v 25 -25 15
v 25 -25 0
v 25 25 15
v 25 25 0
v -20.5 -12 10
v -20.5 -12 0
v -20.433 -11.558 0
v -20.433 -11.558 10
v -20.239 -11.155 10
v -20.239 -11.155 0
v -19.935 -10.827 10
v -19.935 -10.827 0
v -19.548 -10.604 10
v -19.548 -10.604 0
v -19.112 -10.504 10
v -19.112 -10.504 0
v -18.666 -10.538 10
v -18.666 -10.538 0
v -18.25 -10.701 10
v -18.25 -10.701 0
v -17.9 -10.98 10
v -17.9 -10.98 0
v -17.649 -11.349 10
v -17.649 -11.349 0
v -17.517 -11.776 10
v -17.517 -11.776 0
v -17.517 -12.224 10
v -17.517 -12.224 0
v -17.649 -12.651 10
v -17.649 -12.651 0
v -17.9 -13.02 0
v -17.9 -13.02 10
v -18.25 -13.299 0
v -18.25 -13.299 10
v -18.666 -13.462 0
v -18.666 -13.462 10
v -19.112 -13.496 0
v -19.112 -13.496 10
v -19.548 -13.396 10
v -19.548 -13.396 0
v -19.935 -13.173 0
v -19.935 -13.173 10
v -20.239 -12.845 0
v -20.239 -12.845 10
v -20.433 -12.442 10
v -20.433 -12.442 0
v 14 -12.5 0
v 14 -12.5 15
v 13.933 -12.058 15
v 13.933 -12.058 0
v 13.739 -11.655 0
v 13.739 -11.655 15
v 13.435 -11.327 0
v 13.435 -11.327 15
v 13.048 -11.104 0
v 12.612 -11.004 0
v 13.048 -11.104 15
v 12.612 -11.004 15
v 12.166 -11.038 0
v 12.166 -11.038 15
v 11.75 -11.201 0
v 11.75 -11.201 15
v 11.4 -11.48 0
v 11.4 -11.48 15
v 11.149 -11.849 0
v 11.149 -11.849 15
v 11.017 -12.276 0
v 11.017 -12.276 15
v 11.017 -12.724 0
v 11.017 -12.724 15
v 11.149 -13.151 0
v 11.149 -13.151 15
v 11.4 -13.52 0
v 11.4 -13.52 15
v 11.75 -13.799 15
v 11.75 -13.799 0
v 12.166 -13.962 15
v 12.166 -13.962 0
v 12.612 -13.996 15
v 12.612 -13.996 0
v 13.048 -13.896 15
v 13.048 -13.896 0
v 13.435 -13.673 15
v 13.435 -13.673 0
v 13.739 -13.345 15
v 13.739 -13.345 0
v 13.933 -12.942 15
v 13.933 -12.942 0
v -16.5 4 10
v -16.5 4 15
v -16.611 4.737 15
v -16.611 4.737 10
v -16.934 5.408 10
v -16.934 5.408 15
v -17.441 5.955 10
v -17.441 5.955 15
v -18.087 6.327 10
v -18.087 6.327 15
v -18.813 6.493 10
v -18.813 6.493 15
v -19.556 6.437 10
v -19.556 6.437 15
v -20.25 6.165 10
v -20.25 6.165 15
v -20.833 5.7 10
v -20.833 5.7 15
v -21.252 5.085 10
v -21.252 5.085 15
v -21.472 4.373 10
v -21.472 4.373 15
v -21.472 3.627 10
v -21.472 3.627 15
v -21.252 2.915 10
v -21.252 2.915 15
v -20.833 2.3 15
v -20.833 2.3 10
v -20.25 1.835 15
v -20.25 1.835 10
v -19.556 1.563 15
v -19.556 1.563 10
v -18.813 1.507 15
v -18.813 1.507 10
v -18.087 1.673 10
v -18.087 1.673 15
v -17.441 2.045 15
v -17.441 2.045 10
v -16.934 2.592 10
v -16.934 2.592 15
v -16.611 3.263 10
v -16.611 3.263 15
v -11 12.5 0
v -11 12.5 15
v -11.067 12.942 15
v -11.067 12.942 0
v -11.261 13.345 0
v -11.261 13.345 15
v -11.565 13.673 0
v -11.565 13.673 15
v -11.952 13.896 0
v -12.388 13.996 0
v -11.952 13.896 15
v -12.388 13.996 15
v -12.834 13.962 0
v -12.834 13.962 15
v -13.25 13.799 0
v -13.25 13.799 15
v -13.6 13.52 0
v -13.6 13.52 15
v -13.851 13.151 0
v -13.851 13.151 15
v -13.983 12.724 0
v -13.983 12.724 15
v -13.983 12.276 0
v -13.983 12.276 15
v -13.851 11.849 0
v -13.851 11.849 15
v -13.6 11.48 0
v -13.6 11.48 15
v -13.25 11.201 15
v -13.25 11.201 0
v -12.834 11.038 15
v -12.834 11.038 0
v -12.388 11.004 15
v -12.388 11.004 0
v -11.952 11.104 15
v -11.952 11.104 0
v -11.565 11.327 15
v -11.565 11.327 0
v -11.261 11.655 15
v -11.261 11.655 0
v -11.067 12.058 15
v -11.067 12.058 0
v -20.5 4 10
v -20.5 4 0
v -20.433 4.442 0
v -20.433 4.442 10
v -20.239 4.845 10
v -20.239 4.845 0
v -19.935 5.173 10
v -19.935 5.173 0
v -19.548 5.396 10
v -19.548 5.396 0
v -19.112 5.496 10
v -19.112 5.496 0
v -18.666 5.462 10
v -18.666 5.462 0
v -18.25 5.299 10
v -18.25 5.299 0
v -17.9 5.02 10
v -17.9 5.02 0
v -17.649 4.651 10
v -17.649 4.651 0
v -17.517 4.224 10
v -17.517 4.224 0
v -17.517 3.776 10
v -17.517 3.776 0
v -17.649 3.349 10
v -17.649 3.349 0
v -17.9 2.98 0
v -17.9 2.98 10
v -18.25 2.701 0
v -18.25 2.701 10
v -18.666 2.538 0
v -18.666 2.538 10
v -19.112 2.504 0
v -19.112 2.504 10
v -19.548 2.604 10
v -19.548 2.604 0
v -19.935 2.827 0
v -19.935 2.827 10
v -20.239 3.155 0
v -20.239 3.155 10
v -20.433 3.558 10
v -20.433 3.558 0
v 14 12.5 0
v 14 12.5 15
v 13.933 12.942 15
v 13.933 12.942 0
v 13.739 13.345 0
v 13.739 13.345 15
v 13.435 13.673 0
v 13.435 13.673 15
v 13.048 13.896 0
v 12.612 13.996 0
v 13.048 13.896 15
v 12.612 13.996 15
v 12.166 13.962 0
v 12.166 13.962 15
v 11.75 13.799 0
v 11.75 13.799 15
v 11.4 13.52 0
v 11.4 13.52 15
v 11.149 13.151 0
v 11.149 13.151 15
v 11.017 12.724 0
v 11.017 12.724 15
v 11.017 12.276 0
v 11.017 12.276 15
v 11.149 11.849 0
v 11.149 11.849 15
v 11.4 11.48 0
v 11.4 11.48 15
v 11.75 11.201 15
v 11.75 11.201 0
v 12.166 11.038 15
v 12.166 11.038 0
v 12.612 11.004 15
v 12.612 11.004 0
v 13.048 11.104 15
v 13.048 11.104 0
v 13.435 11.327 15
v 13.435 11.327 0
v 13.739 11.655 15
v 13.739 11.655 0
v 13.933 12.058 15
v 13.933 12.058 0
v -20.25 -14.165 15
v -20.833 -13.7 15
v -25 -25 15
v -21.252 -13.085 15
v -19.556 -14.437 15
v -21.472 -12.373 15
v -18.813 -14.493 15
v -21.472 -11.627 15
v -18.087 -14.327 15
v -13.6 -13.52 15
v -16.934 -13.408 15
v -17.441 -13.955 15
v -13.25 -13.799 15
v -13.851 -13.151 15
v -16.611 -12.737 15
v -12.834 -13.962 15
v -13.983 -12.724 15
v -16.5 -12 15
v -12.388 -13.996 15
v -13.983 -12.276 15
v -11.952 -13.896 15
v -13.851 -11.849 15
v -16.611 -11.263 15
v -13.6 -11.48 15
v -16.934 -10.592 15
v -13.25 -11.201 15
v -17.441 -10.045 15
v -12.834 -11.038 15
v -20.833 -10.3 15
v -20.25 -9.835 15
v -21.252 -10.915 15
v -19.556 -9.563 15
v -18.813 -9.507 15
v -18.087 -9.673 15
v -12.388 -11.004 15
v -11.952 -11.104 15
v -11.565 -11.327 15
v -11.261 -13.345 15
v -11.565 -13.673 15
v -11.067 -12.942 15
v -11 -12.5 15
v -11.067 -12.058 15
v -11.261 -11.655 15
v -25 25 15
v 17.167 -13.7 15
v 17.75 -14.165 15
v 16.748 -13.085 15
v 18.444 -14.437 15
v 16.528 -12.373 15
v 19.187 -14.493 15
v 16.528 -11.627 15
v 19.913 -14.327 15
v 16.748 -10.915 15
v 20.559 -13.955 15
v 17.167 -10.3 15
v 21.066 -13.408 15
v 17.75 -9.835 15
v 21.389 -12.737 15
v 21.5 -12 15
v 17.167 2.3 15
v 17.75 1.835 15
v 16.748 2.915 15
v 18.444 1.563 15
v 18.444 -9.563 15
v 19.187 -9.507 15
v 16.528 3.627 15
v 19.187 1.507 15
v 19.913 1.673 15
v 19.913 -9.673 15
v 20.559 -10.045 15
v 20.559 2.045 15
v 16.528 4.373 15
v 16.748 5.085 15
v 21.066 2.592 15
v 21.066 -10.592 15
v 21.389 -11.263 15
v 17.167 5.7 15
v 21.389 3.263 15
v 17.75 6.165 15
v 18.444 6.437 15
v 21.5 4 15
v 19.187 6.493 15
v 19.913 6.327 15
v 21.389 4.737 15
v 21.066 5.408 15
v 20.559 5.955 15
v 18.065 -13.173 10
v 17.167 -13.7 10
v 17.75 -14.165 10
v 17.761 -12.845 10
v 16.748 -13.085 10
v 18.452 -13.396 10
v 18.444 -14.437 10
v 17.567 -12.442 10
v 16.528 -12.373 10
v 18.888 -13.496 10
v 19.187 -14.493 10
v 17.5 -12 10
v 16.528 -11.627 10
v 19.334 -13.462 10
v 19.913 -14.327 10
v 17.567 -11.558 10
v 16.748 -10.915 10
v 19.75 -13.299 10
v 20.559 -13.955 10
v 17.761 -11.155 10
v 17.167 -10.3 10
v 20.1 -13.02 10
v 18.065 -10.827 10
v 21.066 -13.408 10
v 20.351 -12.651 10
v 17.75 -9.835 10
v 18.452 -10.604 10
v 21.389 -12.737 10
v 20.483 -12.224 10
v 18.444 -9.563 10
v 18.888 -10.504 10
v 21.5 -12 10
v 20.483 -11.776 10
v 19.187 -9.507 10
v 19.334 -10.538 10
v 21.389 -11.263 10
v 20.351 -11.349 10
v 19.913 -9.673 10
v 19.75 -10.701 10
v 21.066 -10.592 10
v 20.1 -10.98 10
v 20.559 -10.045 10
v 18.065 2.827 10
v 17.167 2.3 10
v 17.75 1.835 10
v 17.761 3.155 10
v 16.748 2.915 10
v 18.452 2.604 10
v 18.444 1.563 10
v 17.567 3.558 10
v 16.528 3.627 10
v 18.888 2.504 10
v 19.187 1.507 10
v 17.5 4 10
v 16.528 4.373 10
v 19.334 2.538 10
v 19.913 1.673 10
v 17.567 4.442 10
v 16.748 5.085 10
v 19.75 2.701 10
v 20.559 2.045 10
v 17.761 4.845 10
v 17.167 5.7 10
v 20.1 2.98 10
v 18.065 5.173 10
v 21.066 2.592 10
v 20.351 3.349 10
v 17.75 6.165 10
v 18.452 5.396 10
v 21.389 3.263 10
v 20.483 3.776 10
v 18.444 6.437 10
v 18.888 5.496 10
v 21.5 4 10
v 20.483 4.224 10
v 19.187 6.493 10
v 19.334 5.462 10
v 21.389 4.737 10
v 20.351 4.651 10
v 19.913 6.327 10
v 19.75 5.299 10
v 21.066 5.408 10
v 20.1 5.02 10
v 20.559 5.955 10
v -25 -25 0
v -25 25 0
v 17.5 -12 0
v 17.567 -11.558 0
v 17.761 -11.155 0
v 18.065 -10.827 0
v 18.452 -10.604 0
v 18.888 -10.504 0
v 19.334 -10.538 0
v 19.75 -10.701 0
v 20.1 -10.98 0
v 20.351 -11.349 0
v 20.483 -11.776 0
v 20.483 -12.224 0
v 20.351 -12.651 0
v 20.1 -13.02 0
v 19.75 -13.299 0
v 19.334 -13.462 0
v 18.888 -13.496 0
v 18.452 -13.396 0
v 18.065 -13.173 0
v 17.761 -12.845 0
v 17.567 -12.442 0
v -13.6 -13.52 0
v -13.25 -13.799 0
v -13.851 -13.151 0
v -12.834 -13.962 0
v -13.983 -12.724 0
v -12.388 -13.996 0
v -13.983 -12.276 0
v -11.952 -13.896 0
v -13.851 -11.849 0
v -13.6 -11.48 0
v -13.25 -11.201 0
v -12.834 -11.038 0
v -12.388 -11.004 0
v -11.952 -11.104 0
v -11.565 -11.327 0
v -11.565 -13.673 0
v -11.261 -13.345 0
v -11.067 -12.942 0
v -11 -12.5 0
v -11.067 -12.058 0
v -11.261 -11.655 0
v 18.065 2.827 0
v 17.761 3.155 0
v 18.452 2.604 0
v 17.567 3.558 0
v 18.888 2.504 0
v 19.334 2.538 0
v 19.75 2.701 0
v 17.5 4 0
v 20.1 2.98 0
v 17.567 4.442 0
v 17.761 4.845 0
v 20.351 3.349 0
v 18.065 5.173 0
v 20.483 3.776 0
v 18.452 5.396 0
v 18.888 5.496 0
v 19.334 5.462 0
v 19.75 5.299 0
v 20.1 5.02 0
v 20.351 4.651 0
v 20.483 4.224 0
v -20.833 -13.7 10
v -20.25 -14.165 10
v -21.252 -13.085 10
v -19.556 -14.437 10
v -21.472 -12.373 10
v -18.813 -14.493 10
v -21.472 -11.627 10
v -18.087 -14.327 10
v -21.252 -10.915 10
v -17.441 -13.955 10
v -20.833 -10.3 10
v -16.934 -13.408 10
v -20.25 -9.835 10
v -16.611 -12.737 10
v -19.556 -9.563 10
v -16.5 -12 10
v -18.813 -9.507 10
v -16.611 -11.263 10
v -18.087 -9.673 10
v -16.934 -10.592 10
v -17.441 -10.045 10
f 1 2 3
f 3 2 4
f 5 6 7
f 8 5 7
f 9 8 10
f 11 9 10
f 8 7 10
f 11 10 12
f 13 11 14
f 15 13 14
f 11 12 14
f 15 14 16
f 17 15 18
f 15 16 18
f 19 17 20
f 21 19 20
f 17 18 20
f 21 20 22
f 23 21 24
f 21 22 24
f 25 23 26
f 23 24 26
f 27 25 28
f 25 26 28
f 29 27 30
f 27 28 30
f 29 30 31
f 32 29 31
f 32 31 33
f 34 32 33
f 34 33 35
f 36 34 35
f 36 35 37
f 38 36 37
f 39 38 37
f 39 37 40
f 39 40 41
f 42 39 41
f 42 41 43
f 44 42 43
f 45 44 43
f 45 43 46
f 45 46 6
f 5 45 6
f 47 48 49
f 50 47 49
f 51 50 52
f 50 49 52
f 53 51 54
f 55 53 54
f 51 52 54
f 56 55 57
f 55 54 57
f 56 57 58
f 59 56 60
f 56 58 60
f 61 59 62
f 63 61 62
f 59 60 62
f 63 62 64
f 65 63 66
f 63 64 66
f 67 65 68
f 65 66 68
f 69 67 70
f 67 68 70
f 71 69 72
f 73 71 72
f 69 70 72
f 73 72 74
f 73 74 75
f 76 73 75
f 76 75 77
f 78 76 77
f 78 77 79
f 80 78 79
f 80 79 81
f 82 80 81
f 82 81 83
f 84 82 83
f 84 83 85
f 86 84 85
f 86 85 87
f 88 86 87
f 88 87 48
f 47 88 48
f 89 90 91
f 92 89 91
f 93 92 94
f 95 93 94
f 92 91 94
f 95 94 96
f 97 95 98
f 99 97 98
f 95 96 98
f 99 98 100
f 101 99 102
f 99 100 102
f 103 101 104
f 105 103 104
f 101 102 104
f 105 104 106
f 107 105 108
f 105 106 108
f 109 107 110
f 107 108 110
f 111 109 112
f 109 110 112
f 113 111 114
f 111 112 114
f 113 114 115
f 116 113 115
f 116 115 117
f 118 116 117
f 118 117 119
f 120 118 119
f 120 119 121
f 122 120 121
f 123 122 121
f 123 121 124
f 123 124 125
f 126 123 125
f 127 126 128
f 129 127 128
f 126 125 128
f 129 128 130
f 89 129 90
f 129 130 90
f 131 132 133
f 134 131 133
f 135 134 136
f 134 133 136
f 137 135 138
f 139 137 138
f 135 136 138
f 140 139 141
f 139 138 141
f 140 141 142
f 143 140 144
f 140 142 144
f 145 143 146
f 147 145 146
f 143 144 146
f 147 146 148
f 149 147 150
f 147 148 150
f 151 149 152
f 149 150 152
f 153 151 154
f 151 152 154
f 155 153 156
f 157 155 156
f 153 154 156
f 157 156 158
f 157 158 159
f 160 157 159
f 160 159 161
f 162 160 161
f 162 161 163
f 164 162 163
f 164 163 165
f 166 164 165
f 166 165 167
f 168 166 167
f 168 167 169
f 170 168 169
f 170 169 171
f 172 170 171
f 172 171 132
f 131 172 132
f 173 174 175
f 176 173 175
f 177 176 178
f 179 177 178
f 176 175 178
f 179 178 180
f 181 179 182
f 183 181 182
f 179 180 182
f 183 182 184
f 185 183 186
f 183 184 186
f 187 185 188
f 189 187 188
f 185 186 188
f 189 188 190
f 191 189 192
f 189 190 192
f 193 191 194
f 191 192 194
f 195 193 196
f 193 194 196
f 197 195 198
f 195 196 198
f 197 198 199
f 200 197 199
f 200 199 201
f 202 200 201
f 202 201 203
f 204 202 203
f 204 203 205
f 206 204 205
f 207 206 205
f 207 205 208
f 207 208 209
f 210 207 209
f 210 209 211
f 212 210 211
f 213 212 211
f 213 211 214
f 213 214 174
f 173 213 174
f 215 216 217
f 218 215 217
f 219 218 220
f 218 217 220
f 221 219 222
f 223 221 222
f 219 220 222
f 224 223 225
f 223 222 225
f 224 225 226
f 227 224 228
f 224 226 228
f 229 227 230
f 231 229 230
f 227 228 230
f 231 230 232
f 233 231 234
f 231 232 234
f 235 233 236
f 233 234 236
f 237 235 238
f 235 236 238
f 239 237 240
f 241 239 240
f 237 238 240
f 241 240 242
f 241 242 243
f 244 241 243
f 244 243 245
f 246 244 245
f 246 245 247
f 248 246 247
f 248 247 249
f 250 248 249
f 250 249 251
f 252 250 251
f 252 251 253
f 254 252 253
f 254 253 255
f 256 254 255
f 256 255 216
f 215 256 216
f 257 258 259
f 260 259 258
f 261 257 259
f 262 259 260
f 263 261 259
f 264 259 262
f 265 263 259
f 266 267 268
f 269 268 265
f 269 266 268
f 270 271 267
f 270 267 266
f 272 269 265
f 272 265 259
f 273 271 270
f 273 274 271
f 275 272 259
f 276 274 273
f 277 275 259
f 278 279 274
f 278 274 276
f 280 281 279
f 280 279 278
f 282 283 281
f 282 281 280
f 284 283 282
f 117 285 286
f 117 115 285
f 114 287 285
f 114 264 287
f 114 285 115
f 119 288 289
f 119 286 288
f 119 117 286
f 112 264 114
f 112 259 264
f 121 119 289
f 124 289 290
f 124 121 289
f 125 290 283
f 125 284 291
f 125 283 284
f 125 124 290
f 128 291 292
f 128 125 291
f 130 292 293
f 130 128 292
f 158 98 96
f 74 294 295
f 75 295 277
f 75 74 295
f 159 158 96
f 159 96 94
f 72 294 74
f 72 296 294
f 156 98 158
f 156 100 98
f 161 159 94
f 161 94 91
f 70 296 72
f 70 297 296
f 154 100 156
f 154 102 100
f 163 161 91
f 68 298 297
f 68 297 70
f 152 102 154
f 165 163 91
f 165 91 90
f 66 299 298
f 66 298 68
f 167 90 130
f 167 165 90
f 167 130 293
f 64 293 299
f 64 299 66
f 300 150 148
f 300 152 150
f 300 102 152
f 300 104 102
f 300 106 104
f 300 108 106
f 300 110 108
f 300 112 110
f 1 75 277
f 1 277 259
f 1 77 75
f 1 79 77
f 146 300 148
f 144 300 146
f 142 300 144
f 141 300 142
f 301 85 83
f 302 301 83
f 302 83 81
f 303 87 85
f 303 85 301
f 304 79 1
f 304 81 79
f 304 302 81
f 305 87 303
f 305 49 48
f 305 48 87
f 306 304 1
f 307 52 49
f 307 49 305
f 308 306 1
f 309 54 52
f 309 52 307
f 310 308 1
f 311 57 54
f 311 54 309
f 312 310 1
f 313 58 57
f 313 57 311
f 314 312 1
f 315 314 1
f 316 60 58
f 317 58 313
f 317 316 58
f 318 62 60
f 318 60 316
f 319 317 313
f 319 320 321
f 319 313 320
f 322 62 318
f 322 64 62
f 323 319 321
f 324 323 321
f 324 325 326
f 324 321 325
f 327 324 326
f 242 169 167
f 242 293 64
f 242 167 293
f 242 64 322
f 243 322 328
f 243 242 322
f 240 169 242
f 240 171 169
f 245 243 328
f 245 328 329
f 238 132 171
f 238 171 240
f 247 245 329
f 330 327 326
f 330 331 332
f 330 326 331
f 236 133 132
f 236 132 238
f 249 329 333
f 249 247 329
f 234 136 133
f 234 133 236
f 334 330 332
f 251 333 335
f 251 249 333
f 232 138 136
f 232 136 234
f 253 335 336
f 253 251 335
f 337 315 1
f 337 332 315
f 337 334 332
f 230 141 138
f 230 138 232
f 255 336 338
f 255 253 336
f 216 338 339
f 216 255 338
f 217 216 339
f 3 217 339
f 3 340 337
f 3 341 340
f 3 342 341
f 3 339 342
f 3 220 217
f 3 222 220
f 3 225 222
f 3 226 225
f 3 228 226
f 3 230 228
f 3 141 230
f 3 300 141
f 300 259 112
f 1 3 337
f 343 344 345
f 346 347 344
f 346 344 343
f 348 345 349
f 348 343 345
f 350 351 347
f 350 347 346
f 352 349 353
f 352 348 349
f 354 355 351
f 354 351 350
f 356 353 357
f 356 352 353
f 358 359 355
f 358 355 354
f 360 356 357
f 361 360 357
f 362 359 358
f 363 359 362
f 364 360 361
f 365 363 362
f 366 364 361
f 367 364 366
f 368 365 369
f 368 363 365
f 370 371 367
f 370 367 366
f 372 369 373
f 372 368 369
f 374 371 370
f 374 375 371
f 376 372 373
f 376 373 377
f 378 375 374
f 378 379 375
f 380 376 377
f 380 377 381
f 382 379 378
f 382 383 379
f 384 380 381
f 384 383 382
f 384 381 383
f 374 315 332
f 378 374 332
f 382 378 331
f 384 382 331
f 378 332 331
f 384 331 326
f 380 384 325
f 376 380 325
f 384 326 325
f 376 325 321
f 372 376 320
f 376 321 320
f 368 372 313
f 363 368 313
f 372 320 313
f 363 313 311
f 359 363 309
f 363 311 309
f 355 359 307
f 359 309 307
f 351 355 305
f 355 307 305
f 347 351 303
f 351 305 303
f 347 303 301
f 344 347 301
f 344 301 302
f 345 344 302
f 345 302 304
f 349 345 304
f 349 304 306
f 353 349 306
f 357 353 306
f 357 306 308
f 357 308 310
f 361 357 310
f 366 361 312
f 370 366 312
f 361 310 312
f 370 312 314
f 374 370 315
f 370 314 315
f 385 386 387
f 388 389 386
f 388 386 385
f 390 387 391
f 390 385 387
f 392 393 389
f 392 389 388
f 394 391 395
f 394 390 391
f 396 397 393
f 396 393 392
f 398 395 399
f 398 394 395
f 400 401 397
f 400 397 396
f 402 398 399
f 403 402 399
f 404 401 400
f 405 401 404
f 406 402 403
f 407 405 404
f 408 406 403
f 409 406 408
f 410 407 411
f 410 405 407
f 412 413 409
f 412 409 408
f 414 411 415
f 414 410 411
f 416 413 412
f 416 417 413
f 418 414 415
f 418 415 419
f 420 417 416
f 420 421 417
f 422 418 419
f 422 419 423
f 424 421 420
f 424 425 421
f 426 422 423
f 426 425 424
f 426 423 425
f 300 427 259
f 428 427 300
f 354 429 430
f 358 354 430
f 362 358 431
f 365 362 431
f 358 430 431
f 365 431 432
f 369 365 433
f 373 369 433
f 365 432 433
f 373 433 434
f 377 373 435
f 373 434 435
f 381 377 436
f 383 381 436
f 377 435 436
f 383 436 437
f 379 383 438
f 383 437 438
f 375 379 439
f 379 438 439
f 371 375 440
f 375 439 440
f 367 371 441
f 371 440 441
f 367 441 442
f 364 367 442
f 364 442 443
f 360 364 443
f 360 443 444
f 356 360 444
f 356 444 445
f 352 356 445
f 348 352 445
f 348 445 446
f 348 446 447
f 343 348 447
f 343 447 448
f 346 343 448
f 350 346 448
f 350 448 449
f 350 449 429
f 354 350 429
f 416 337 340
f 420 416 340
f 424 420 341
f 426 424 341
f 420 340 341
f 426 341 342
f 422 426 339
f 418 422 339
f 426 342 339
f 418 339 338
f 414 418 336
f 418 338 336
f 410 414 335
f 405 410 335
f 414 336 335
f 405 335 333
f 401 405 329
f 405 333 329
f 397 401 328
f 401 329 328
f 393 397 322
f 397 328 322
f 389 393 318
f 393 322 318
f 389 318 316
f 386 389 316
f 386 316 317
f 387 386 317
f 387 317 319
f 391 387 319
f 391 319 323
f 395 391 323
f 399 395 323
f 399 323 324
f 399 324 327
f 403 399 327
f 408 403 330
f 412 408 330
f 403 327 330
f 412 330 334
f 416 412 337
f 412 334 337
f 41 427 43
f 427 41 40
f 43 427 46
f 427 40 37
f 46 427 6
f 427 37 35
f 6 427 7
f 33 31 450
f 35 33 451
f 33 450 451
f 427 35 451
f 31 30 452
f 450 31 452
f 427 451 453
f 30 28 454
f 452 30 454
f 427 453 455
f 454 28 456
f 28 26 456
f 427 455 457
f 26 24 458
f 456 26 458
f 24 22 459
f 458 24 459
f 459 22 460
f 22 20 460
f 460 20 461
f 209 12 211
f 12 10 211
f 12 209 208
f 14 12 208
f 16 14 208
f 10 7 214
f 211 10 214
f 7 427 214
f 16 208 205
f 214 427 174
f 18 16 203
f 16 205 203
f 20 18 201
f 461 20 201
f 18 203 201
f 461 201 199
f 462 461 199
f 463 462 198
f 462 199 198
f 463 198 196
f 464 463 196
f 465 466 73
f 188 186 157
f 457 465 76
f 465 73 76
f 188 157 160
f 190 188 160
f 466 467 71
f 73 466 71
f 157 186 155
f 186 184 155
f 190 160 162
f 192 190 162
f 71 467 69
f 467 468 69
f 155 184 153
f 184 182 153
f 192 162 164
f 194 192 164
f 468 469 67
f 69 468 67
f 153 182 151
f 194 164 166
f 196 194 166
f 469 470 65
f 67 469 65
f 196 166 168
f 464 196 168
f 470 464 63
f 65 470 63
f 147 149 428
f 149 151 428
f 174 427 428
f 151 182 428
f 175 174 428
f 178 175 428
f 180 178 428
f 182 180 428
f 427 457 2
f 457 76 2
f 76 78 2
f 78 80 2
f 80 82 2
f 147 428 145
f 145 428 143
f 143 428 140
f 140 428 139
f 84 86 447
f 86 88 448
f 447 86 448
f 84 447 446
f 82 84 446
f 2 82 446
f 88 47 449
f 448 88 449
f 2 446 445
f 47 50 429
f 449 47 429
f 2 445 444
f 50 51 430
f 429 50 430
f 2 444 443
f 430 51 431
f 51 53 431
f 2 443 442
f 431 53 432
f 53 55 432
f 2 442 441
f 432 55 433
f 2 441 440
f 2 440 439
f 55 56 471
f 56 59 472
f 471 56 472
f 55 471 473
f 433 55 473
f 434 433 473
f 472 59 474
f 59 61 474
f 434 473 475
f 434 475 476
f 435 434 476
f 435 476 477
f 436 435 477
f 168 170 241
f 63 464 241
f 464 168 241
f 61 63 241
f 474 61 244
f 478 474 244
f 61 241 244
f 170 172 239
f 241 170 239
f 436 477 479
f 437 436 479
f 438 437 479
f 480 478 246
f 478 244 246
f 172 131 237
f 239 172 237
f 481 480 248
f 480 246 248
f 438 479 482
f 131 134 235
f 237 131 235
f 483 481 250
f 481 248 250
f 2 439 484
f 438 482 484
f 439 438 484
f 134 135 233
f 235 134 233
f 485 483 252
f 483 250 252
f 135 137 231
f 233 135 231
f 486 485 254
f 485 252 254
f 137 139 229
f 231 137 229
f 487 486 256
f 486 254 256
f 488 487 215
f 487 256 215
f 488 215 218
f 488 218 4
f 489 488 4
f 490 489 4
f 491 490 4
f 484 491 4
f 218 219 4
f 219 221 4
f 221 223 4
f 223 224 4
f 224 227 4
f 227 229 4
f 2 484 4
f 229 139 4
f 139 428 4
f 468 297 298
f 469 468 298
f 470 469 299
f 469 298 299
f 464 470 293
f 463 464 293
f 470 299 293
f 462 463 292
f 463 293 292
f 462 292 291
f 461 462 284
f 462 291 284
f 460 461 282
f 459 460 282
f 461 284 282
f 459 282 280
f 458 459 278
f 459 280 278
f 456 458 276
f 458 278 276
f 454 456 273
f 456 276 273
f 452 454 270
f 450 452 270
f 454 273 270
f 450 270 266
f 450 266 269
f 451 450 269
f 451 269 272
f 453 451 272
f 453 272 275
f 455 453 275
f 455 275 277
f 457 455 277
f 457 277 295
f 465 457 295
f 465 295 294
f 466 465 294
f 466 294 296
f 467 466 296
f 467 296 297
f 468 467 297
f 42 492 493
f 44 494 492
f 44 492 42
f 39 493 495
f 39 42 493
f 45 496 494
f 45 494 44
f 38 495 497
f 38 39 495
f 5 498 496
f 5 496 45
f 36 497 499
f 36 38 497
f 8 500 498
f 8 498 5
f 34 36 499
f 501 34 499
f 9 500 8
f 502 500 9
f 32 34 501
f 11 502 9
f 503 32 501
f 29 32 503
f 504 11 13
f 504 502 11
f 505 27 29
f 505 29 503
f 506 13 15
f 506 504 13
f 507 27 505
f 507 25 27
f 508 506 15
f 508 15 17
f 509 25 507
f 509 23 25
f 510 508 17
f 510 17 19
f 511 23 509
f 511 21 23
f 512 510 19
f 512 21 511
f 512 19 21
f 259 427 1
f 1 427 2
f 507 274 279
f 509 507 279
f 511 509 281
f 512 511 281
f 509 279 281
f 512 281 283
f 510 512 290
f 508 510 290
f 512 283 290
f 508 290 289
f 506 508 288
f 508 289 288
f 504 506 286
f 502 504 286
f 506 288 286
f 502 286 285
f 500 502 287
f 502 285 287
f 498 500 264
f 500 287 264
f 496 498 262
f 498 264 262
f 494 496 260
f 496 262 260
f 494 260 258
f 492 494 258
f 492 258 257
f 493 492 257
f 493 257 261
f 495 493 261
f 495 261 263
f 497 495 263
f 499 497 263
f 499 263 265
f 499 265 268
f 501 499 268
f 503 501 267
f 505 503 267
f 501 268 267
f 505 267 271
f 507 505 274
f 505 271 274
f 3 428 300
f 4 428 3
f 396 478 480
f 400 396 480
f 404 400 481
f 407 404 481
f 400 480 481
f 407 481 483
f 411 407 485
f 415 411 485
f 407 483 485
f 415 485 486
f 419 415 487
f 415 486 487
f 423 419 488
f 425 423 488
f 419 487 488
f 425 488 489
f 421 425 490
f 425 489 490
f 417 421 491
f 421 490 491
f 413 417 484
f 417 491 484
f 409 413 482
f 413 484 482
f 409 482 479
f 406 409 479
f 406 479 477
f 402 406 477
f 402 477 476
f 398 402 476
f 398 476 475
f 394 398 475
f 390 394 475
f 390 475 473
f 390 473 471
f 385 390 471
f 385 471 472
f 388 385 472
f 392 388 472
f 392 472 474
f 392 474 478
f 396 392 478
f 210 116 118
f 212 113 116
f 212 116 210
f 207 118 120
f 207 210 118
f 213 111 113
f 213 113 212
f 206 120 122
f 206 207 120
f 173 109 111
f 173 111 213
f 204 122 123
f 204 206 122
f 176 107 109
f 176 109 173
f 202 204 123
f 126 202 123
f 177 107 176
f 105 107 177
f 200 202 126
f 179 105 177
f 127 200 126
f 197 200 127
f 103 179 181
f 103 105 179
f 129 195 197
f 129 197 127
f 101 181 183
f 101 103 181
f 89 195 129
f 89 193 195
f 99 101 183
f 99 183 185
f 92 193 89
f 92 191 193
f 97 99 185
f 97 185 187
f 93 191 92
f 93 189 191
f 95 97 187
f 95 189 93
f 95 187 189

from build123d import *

# Parameters (mm, degrees)
SKETCH1_W           = 50
SKETCH1_H           = 50
BOSS_EXTRUDE1_DEPTH = 15
CUT_EXTRUDE1_REACH  = 40.406
SKETCH2_R           = 1.5
SKETCH3_R           = 2.5
CUT_EXTRUDE2_DEPTH  = 5
CUT_EXTRUDE3_REACH  = 40.406
SKETCH4_R           = 1.5


with BuildPart() as part:
    # Sketch1 → Boss-Extrude1 (new body)
    with BuildSketch(Plane.XY):
        Rectangle(SKETCH1_W, SKETCH1_H)
    extrude(amount=BOSS_EXTRUDE1_DEPTH)

    # Sketch2 → Cut-Extrude1 (cut, up to next)
    with BuildSketch(Plane(origin=(0, 0, 0), x_dir=(-1, 0, 0), z_dir=(0, 0, -1)), mode=Mode.PRIVATE) as cut_extrude1_sk1:
        with Locations((-19, 4)):
            Circle(SKETCH2_R)
    cut_extrude1_tool1 = extrude(cut_extrude1_sk1.sketch, amount=-CUT_EXTRUDE1_REACH, mode=Mode.PRIVATE) & part.part
    # Sketch2 → Cut-Extrude1 (cut, up to next)
    with BuildSketch(Plane(origin=(0, 0, 0), x_dir=(-1, 0, 0), z_dir=(0, 0, -1)), mode=Mode.PRIVATE) as cut_extrude1_sk2:
        with Locations((-19, -12)):
            Circle(SKETCH2_R)
    cut_extrude1_tool2 = extrude(cut_extrude1_sk2.sketch, amount=-CUT_EXTRUDE1_REACH, mode=Mode.PRIVATE) & part.part
    # Sketch2 → Cut-Extrude1 (cut, up to next)
    with BuildSketch(Plane(origin=(0, 0, 0), x_dir=(-1, 0, 0), z_dir=(0, 0, -1)), mode=Mode.PRIVATE) as cut_extrude1_sk3:
        with Locations((19, -12)):
            Circle(SKETCH2_R)
    cut_extrude1_tool3 = extrude(cut_extrude1_sk3.sketch, amount=-CUT_EXTRUDE1_REACH, mode=Mode.PRIVATE) & part.part
    # Sketch2 → Cut-Extrude1 (cut, up to next)
    with BuildSketch(Plane(origin=(0, 0, 0), x_dir=(-1, 0, 0), z_dir=(0, 0, -1)), mode=Mode.PRIVATE) as cut_extrude1_sk4:
        with Locations((19, 4)):
            Circle(SKETCH2_R)
    cut_extrude1_tool4 = extrude(cut_extrude1_sk4.sketch, amount=-CUT_EXTRUDE1_REACH, mode=Mode.PRIVATE) & part.part
    add(cut_extrude1_tool1.solids().sort_by_distance((19, 4, 0))[0], mode=Mode.SUBTRACT)
    add(cut_extrude1_tool2.solids().sort_by_distance((19, -12, 0))[0], mode=Mode.SUBTRACT)
    add(cut_extrude1_tool3.solids().sort_by_distance((-19, -12, 0))[0], mode=Mode.SUBTRACT)
    add(cut_extrude1_tool4.solids().sort_by_distance((-19, 4, 0))[0], mode=Mode.SUBTRACT)

    # Sketch3 → Cut-Extrude2 (cut)
    with BuildSketch(Plane.XY.offset(15)):
        with Locations((-19, 4)):
            Circle(SKETCH3_R)
        with Locations((-19, -12)):
            Circle(SKETCH3_R)
        with Locations((19, 4)):
            Circle(SKETCH3_R)
        with Locations((19, -12)):
            Circle(SKETCH3_R)
    extrude(amount=-CUT_EXTRUDE2_DEPTH, mode=Mode.SUBTRACT)

    # Sketch4 → Cut-Extrude3 (cut, up to next)
    with BuildSketch(Plane.XY.offset(15), mode=Mode.PRIVATE) as cut_extrude3_sk1:
        with Locations((-12.5, -12.5)):
            Circle(SKETCH4_R)
    cut_extrude3_tool1 = extrude(cut_extrude3_sk1.sketch, amount=-CUT_EXTRUDE3_REACH, mode=Mode.PRIVATE) & part.part
    # Sketch4 → Cut-Extrude3 (cut, up to next)
    with BuildSketch(Plane.XY.offset(15), mode=Mode.PRIVATE) as cut_extrude3_sk2:
        with Locations((-12.5, 12.5)):
            Circle(SKETCH4_R)
    cut_extrude3_tool2 = extrude(cut_extrude3_sk2.sketch, amount=-CUT_EXTRUDE3_REACH, mode=Mode.PRIVATE) & part.part
    # Sketch4 → Cut-Extrude3 (cut, up to next)
    with BuildSketch(Plane.XY.offset(15), mode=Mode.PRIVATE) as cut_extrude3_sk3:
        with Locations((12.5, -12.5)):
            Circle(SKETCH4_R)
    cut_extrude3_tool3 = extrude(cut_extrude3_sk3.sketch, amount=-CUT_EXTRUDE3_REACH, mode=Mode.PRIVATE) & part.part
    # Sketch4 → Cut-Extrude3 (cut, up to next)
    with BuildSketch(Plane.XY.offset(15), mode=Mode.PRIVATE) as cut_extrude3_sk4:
        with Locations((12.5, 12.5)):
            Circle(SKETCH4_R)
    cut_extrude3_tool4 = extrude(cut_extrude3_sk4.sketch, amount=-CUT_EXTRUDE3_REACH, mode=Mode.PRIVATE) & part.part
    add(cut_extrude3_tool1.solids().sort_by_distance((-12.5, -12.5, 15))[0], mode=Mode.SUBTRACT)
    add(cut_extrude3_tool2.solids().sort_by_distance((-12.5, 12.5, 15))[0], mode=Mode.SUBTRACT)
    add(cut_extrude3_tool3.solids().sort_by_distance((12.5, -12.5, 15))[0], mode=Mode.SUBTRACT)
    add(cut_extrude3_tool4.solids().sort_by_distance((12.5, 12.5, 15))[0], mode=Mode.SUBTRACT)


solid = part.part
